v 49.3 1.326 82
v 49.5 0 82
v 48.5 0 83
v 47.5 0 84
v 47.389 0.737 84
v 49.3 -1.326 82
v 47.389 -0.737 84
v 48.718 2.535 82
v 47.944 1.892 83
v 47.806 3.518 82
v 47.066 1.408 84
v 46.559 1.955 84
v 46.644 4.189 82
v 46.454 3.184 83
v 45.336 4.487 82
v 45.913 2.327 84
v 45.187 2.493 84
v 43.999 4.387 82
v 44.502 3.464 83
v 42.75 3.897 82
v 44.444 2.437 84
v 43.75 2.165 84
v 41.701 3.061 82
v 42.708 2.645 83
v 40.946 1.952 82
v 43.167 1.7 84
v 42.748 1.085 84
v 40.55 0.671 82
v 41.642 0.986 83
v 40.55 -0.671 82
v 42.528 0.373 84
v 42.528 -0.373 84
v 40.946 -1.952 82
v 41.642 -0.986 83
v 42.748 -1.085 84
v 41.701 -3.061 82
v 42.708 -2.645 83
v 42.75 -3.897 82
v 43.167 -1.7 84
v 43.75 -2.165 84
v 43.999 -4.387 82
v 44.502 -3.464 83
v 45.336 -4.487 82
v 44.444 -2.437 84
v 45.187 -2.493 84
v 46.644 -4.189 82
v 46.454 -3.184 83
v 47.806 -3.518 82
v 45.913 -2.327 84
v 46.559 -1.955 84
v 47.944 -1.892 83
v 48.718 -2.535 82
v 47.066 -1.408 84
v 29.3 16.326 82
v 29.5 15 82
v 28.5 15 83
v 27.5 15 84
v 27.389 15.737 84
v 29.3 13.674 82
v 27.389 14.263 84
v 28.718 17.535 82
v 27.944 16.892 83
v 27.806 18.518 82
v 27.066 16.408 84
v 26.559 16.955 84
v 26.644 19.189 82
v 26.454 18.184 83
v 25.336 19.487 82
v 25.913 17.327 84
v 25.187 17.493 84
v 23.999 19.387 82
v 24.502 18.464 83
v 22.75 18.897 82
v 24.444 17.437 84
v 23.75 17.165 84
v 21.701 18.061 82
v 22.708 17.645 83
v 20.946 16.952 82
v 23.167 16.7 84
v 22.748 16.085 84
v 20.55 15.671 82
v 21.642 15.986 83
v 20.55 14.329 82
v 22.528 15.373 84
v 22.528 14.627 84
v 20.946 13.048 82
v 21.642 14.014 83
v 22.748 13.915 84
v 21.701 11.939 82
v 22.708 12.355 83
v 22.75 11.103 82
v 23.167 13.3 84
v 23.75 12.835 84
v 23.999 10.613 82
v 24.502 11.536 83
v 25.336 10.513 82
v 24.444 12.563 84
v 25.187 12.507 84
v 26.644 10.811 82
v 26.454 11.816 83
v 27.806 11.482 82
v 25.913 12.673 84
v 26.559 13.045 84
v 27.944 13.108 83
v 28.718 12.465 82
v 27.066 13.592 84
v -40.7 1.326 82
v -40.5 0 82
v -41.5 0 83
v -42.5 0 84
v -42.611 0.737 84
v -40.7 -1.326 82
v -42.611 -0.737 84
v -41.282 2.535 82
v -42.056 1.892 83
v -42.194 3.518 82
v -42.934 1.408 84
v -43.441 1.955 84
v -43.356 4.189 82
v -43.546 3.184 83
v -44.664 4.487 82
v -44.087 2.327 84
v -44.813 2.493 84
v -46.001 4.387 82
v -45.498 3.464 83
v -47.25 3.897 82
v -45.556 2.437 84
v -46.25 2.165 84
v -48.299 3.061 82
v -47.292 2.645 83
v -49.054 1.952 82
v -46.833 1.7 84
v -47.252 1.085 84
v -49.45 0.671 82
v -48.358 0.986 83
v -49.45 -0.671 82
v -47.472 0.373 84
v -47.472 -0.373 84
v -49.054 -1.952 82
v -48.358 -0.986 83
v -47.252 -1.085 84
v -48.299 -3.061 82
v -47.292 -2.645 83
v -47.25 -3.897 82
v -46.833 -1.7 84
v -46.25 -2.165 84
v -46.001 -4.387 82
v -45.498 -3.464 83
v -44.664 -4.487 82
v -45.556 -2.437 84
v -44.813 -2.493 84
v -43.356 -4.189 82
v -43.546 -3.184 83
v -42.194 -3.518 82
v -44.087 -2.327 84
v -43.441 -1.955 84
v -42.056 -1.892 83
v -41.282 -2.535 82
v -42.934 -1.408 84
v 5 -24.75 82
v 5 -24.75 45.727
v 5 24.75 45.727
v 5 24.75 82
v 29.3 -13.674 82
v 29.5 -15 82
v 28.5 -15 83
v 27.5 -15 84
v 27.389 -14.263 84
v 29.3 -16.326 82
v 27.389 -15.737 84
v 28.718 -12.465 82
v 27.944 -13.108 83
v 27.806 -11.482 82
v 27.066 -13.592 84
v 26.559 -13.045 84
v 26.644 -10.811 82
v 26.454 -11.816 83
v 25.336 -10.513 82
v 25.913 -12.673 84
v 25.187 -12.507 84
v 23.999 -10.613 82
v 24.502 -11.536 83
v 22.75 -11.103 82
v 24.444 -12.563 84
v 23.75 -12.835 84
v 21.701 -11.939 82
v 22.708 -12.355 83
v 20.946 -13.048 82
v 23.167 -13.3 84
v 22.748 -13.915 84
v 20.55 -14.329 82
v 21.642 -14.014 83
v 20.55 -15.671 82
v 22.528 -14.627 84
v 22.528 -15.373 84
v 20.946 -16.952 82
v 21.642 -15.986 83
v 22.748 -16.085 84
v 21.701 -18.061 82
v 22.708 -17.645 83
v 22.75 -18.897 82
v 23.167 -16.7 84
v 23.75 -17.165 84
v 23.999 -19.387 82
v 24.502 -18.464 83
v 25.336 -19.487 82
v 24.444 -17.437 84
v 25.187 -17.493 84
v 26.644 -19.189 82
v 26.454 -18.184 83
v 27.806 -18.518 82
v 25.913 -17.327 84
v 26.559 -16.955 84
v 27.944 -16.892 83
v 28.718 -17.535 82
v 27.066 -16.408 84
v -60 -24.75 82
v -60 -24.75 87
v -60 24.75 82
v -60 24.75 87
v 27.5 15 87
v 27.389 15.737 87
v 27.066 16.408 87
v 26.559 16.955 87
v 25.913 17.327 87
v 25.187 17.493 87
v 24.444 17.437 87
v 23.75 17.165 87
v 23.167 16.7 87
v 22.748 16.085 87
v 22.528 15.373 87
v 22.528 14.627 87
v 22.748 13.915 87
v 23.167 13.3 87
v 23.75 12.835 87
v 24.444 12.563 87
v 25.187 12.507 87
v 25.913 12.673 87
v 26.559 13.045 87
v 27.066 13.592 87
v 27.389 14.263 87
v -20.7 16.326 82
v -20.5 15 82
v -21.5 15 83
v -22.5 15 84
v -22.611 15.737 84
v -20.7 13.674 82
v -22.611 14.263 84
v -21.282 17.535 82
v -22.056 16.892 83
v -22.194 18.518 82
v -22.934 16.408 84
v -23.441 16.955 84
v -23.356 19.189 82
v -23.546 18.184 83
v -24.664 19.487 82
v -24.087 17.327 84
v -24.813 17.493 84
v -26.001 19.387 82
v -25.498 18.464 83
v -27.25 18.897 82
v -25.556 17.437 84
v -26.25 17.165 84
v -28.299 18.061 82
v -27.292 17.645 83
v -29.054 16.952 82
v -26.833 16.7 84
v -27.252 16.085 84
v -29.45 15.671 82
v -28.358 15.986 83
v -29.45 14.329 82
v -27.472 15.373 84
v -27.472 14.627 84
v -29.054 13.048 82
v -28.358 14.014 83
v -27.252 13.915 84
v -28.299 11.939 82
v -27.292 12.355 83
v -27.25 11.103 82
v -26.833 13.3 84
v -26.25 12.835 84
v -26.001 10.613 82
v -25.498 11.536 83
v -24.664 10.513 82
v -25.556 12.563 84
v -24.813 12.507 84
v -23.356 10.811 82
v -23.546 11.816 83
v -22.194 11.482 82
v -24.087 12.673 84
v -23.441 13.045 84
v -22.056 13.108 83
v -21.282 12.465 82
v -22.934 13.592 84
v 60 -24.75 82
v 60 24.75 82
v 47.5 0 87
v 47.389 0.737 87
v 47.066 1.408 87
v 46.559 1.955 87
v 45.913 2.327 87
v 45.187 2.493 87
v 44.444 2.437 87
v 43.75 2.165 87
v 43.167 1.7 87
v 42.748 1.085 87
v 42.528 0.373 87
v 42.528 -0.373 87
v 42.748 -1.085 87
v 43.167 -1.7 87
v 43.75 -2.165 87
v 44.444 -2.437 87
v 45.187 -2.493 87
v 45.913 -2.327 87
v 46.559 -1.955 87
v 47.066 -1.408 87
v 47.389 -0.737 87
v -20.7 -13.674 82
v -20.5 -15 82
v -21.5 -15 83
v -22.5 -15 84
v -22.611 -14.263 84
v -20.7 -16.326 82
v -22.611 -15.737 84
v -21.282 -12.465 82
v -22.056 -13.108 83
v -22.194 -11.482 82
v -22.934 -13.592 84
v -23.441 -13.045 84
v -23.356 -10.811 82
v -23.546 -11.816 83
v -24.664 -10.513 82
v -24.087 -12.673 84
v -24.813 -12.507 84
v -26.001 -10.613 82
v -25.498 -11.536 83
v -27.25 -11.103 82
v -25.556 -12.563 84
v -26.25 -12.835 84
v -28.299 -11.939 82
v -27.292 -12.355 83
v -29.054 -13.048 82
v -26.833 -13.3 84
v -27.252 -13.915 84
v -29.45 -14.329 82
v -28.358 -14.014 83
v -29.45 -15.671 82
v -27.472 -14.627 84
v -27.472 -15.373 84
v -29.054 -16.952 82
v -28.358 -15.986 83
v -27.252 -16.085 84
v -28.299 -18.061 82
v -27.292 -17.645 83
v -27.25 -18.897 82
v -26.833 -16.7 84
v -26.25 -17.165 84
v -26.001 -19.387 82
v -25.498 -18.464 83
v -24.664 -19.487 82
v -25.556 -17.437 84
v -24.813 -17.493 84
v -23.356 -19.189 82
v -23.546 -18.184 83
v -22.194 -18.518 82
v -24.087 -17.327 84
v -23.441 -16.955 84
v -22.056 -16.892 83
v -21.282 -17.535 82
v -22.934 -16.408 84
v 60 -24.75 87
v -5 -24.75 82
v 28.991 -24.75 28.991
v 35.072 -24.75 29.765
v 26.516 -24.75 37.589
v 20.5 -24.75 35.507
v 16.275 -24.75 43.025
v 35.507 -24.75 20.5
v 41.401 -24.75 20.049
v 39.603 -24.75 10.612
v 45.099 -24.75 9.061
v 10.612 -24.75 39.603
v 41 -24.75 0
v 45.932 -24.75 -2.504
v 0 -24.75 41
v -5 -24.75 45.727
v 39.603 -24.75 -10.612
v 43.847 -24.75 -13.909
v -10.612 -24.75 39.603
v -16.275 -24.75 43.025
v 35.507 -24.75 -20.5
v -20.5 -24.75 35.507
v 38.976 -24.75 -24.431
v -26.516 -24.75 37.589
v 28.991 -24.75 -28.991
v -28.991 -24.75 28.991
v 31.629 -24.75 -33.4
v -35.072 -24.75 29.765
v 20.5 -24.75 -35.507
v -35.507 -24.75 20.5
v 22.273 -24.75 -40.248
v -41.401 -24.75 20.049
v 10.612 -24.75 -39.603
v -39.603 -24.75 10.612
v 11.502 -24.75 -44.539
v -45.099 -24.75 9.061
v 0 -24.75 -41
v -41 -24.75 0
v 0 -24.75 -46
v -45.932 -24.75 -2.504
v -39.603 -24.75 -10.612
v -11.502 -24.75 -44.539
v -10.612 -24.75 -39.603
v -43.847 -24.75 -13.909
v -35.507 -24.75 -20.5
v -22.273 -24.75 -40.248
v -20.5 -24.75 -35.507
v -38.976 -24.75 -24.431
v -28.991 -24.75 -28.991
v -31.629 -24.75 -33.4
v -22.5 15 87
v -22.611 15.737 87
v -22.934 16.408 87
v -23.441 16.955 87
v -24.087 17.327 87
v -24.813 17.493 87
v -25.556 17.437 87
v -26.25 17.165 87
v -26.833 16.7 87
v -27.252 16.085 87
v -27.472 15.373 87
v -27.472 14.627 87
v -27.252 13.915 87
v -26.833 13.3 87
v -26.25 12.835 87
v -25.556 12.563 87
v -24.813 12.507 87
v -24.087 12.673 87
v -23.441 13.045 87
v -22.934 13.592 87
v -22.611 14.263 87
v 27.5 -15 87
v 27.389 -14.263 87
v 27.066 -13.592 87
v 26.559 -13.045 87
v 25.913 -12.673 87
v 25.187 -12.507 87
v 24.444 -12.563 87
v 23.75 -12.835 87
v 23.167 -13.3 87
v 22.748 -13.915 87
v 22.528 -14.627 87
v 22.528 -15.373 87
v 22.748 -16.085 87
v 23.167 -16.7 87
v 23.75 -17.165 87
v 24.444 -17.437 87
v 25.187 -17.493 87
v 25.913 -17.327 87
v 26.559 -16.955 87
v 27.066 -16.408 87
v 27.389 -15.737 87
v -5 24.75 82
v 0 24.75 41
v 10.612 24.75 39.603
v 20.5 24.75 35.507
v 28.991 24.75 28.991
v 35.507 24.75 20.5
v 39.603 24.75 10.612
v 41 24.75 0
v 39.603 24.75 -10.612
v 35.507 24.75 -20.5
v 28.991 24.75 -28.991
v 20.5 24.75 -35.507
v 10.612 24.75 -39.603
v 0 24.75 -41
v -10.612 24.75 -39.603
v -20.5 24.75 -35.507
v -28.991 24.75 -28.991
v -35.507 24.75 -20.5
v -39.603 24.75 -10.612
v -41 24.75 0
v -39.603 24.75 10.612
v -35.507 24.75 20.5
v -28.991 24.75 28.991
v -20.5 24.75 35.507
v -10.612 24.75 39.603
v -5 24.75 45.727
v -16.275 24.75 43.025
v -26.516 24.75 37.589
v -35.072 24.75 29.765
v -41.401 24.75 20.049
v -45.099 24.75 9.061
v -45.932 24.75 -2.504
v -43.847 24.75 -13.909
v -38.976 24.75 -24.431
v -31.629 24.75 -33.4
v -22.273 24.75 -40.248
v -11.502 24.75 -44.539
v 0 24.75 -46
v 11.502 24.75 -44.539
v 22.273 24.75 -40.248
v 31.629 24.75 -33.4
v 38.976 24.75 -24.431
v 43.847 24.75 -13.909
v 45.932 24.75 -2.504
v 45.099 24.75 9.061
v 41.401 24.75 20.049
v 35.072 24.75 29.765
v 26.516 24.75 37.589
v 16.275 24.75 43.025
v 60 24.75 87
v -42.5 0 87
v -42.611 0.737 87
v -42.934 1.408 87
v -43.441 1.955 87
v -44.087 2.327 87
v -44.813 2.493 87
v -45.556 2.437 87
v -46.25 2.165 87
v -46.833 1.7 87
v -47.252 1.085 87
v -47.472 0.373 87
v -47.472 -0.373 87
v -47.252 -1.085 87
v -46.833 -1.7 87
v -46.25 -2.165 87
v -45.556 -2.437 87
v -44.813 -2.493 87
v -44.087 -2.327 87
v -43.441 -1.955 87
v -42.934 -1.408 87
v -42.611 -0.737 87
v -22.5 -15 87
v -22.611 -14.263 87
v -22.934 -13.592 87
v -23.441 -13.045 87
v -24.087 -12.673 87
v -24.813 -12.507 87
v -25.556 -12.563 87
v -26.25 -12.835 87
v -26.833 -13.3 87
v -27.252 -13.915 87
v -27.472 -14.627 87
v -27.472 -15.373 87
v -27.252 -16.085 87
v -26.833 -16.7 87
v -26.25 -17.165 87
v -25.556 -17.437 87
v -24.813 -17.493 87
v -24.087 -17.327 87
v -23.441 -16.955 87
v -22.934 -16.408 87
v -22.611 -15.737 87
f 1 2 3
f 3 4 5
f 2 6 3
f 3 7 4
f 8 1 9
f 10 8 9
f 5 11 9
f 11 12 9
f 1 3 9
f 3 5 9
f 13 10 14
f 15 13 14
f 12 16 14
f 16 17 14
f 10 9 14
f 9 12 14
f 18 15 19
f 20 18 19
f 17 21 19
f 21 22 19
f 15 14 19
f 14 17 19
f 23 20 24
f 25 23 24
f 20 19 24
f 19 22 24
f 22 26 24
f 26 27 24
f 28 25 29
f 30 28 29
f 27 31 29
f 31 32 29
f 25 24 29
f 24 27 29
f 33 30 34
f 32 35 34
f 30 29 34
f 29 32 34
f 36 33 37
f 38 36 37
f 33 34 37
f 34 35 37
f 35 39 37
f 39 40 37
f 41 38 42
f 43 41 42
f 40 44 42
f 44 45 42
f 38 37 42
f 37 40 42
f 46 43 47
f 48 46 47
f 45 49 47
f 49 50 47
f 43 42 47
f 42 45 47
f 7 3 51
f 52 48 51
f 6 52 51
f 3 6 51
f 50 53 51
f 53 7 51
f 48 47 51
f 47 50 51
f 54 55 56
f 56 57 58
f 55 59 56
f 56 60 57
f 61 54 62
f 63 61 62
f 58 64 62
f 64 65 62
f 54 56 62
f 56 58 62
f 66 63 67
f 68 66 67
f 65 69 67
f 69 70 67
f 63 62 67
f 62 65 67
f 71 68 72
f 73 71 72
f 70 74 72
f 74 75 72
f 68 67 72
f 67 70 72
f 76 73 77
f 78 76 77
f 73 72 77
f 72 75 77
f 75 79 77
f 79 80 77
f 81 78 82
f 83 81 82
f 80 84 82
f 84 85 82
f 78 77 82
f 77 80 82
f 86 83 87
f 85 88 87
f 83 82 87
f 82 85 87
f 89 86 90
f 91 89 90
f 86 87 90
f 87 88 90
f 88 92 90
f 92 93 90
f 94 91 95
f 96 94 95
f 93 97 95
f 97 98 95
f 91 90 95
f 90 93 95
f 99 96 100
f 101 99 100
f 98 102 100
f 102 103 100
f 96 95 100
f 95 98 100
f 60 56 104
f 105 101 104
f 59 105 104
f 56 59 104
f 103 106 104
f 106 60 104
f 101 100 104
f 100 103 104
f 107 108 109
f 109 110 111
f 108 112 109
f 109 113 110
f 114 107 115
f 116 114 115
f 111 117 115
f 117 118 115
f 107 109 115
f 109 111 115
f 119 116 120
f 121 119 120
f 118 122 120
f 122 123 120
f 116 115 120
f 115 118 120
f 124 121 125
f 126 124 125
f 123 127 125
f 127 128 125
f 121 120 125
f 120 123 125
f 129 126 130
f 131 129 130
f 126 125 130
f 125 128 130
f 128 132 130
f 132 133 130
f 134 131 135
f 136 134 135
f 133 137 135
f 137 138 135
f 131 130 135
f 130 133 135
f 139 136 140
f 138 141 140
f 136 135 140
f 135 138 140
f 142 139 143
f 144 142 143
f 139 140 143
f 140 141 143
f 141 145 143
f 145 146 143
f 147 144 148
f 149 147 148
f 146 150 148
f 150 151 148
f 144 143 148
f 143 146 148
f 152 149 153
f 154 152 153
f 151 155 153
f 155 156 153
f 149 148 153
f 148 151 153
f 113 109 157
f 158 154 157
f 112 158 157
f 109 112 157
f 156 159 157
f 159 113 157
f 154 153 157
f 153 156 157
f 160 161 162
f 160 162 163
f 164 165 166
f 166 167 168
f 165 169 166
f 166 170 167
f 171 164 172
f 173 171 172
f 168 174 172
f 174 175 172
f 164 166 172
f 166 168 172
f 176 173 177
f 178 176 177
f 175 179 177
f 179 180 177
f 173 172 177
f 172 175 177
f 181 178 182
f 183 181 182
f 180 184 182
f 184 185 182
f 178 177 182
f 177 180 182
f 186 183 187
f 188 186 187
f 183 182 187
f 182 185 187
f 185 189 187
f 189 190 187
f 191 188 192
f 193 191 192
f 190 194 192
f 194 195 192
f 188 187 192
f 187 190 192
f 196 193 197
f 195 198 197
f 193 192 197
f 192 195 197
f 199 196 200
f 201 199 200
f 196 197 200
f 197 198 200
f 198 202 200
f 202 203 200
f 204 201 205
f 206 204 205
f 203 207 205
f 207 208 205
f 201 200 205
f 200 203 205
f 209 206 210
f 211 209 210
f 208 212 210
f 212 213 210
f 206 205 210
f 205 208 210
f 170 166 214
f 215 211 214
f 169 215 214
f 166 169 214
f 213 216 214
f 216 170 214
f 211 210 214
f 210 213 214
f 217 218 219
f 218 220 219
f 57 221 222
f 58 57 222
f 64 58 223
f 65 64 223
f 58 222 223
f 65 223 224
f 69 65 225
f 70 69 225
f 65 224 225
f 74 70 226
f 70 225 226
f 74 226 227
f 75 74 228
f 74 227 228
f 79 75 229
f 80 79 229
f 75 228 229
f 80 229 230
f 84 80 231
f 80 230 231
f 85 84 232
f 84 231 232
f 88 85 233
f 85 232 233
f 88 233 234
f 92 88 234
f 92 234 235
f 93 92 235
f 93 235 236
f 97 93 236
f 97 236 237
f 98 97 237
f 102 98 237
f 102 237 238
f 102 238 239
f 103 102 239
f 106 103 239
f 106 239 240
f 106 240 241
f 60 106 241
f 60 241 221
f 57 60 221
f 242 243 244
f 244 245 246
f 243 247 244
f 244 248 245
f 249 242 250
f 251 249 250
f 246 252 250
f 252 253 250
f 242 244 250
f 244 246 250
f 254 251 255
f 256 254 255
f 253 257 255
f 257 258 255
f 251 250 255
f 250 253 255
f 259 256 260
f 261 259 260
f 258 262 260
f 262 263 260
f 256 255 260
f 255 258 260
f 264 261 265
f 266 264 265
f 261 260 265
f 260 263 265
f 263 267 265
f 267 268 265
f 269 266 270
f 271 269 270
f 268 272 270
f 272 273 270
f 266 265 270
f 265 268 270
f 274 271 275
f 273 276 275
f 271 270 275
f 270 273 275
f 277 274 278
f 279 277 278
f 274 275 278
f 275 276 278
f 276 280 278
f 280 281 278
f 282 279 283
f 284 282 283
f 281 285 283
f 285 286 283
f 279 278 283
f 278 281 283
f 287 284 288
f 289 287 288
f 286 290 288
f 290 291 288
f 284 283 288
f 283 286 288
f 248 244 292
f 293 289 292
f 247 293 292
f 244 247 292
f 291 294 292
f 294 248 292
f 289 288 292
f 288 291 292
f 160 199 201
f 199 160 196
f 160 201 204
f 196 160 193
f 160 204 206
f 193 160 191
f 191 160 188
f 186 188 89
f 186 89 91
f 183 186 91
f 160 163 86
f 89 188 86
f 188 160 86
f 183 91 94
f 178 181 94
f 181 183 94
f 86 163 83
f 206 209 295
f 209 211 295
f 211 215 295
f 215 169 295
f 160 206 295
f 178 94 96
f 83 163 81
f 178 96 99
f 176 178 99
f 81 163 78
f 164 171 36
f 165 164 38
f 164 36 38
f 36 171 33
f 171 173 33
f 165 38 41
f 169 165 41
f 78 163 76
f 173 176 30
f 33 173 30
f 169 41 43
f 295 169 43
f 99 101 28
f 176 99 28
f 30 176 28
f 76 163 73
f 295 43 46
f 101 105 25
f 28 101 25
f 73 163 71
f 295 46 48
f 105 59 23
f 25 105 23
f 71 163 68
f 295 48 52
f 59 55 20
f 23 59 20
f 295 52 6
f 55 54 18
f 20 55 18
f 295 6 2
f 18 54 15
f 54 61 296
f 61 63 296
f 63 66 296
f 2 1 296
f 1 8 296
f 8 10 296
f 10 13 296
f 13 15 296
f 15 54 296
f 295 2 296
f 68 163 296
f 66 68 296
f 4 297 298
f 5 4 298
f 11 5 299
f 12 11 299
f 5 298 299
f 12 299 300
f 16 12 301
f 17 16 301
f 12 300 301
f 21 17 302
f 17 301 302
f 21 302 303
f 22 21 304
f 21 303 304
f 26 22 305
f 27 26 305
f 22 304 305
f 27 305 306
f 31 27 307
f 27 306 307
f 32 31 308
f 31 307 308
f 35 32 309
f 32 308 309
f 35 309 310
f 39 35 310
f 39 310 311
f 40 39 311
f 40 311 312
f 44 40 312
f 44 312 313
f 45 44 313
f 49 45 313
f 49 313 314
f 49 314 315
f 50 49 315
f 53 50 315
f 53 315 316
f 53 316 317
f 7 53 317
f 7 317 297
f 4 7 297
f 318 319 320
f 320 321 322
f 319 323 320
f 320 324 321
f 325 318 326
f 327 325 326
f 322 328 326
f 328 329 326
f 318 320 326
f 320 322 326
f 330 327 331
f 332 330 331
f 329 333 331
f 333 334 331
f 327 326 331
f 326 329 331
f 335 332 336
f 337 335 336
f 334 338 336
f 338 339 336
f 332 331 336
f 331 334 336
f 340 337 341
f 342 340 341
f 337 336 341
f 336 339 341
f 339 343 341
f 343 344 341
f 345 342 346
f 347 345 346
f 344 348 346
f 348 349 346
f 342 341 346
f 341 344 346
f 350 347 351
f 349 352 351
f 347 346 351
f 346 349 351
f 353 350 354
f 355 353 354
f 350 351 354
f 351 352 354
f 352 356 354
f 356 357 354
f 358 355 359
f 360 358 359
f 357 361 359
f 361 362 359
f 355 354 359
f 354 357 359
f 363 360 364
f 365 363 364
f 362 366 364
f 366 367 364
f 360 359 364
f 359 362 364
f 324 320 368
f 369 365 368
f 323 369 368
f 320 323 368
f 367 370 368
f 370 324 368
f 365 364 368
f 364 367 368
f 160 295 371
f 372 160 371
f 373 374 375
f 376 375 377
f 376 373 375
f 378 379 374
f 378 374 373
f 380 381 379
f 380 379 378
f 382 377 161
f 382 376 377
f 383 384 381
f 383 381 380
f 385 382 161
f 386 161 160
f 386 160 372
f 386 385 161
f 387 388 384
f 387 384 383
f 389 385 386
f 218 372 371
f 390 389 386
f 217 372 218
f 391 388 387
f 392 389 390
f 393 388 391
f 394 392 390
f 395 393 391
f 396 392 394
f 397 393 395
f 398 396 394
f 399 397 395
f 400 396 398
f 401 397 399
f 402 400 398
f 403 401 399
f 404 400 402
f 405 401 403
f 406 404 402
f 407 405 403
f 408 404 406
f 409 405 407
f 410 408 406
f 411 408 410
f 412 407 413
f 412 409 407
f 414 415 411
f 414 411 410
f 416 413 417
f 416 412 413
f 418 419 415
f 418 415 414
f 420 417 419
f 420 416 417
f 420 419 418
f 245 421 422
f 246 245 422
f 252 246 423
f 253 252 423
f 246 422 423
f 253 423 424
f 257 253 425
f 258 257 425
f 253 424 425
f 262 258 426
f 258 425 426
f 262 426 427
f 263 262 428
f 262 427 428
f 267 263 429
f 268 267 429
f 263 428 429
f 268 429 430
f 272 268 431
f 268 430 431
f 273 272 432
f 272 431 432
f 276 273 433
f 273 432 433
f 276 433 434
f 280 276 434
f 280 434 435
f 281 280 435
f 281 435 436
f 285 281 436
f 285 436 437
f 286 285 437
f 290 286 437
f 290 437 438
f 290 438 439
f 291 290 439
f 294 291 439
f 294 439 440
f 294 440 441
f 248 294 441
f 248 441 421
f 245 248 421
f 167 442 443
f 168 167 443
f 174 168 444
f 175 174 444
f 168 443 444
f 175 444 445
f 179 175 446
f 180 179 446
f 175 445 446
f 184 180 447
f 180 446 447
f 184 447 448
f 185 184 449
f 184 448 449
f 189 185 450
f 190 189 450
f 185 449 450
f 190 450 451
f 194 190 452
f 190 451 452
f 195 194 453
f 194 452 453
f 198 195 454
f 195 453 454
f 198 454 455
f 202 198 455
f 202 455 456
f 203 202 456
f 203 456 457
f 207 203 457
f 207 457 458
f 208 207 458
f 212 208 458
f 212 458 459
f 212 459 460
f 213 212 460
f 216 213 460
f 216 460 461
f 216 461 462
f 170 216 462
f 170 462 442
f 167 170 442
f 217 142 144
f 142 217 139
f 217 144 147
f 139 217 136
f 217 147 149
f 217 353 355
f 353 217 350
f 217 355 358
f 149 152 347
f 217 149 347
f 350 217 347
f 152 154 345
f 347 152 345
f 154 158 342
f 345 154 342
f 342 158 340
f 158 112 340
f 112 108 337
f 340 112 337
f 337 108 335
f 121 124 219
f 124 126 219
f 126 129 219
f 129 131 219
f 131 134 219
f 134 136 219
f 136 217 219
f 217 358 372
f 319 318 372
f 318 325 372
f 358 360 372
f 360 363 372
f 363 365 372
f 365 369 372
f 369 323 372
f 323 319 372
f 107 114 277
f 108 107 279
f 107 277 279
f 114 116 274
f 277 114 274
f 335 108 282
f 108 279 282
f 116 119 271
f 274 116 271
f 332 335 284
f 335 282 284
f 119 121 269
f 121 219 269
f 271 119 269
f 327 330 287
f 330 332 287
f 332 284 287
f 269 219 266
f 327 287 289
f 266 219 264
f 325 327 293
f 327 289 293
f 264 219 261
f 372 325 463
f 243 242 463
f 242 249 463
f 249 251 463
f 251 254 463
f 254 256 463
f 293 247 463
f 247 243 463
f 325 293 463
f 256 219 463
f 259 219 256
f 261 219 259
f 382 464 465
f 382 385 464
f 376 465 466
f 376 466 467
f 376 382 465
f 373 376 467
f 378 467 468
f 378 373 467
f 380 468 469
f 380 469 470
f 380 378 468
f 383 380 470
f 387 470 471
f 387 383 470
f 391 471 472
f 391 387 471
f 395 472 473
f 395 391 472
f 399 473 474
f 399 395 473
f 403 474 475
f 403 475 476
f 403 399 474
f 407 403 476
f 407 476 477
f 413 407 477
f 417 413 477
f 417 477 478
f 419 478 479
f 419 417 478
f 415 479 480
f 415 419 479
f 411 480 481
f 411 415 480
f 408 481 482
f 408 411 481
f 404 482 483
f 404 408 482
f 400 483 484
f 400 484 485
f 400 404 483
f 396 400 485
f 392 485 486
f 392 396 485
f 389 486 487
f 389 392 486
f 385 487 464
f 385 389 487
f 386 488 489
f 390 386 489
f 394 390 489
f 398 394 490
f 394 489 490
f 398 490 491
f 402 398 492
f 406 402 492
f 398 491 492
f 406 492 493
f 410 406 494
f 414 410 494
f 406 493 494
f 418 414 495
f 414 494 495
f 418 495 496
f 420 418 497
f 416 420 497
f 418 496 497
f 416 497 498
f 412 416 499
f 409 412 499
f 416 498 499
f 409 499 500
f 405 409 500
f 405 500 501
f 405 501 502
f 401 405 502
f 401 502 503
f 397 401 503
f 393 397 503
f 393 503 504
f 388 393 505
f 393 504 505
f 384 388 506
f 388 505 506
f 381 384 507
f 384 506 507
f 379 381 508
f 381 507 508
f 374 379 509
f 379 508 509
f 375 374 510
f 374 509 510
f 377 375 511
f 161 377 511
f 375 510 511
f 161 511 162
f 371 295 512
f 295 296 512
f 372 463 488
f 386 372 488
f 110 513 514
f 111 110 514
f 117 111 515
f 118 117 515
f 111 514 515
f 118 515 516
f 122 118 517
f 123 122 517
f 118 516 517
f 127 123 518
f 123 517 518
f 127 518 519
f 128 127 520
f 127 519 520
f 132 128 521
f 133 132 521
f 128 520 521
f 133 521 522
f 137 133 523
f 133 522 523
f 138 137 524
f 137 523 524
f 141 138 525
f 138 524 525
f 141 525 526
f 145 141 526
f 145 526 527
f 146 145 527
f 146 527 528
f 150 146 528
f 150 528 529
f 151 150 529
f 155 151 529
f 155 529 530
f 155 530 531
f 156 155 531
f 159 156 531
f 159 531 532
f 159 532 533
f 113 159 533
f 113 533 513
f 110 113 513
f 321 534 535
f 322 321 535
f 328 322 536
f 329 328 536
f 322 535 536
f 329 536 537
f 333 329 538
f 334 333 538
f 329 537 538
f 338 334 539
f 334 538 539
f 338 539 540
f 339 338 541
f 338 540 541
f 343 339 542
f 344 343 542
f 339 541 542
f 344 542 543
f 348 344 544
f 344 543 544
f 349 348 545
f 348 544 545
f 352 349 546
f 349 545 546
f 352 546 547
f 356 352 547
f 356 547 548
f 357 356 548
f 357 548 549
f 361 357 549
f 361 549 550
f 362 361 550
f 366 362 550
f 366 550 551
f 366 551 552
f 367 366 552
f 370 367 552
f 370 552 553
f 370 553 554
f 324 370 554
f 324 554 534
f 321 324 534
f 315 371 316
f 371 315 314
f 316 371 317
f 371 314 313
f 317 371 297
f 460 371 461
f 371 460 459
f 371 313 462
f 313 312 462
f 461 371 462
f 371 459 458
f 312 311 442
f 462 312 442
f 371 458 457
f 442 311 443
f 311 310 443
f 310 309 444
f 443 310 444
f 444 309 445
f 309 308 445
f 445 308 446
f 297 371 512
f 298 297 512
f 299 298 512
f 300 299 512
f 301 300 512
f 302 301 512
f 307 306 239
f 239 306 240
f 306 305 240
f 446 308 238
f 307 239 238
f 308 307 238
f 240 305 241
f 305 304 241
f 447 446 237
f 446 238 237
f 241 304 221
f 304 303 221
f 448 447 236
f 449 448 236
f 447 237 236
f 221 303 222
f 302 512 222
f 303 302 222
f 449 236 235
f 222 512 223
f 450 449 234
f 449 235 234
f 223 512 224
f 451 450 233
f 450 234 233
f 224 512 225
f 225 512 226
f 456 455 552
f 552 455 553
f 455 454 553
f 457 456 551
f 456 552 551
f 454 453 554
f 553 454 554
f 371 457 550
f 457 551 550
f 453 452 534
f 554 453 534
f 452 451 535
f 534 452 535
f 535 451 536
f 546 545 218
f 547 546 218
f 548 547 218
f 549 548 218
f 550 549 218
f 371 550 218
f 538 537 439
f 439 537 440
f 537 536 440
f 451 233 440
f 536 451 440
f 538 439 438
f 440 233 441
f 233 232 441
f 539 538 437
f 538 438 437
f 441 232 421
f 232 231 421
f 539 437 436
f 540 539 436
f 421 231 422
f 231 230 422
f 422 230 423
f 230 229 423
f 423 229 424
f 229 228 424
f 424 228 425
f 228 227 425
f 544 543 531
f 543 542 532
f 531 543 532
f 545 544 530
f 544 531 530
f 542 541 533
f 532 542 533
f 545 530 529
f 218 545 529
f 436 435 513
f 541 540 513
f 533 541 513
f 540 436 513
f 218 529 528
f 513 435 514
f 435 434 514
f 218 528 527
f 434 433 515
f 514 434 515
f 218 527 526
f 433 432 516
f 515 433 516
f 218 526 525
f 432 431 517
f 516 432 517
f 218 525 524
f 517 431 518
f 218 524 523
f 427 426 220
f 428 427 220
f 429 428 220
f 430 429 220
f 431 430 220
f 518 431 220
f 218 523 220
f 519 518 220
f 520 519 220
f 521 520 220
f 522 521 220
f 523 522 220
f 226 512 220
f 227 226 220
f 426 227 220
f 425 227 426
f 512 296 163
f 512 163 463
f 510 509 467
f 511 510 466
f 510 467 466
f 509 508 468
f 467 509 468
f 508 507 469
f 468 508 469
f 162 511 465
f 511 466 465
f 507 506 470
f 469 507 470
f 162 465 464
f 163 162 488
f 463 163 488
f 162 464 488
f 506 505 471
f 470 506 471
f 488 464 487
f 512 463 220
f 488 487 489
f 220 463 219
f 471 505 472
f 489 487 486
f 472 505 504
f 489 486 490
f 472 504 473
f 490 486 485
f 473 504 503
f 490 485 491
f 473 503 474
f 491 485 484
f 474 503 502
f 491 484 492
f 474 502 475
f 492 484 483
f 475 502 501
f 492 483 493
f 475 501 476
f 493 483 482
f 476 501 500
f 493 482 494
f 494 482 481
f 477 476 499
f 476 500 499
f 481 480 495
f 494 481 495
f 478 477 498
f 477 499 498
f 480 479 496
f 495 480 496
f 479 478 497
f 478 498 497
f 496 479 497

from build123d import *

# Parameters (mm, degrees)
SKETCH3_R           = 41
BOSS_EXTRUDE1_DEPTH = 24.75
SKETCH4_R           = 2.5
CUT_EXTRUDE1_DEPTH  = 30
CHAMFER1_SIZE       = 2


with BuildPart() as part:
    # Sketch3 → Boss-Extrude1 (new, symmetric)
    with BuildSketch(Plane(origin=(0, 0, 0), x_dir=(1, 0, 0), z_dir=(0, 1, 0))):
        with BuildLine():
            Line((5, -82), (60, -82))
            Line((60, -82), (60, -87))
            Line((60, -87), (-60, -87))
            Line((-60, -87), (-60, -82))
            Line((-60, -82), (-5, -82))
            Line((-5, -82), (-5, -45.727453461))
            ThreePointArc((-5, -45.727453461), (0, 46), (5, -45.727453461))
            Line((5, -45.727453461), (5, -82))
        make_face()
        with Locations(Location((0, 0, 0), (0, 0, 270))):
            Circle(SKETCH3_R, mode=Mode.SUBTRACT)
    extrude(amount=BOSS_EXTRUDE1_DEPTH, both=True)

    # Sketch4 → Cut-Extrude1 (cut)
    with BuildSketch(Plane.XY.offset(87)):
        with Locations((-25, 15)):
            Circle(SKETCH4_R)
        with Locations((-45, 0)):
            Circle(SKETCH4_R)
        with Locations((-25, -15)):
            Circle(SKETCH4_R)
        with Locations((25, -15)):
            Circle(SKETCH4_R)
        with Locations((45, 0)):
            Circle(SKETCH4_R)
        with Locations((25, 15)):
            Circle(SKETCH4_R)
    extrude(amount=-CUT_EXTRUDE1_DEPTH, mode=Mode.SUBTRACT)

    # Chamfer1
    chamfer1_edges = [part.edges().sort_by_distance(p)[0] for p in [
        (-47.5, 0, 82),
        (-27.5, 15, 82),
        (-27.5, -15, 82),
        (22.5, 15, 82),
        (22.5, -15, 82),
        (42.5, 0, 82),
    ]]
    chamfer(chamfer1_edges, length=CHAMFER1_SIZE)


solid = part.part
